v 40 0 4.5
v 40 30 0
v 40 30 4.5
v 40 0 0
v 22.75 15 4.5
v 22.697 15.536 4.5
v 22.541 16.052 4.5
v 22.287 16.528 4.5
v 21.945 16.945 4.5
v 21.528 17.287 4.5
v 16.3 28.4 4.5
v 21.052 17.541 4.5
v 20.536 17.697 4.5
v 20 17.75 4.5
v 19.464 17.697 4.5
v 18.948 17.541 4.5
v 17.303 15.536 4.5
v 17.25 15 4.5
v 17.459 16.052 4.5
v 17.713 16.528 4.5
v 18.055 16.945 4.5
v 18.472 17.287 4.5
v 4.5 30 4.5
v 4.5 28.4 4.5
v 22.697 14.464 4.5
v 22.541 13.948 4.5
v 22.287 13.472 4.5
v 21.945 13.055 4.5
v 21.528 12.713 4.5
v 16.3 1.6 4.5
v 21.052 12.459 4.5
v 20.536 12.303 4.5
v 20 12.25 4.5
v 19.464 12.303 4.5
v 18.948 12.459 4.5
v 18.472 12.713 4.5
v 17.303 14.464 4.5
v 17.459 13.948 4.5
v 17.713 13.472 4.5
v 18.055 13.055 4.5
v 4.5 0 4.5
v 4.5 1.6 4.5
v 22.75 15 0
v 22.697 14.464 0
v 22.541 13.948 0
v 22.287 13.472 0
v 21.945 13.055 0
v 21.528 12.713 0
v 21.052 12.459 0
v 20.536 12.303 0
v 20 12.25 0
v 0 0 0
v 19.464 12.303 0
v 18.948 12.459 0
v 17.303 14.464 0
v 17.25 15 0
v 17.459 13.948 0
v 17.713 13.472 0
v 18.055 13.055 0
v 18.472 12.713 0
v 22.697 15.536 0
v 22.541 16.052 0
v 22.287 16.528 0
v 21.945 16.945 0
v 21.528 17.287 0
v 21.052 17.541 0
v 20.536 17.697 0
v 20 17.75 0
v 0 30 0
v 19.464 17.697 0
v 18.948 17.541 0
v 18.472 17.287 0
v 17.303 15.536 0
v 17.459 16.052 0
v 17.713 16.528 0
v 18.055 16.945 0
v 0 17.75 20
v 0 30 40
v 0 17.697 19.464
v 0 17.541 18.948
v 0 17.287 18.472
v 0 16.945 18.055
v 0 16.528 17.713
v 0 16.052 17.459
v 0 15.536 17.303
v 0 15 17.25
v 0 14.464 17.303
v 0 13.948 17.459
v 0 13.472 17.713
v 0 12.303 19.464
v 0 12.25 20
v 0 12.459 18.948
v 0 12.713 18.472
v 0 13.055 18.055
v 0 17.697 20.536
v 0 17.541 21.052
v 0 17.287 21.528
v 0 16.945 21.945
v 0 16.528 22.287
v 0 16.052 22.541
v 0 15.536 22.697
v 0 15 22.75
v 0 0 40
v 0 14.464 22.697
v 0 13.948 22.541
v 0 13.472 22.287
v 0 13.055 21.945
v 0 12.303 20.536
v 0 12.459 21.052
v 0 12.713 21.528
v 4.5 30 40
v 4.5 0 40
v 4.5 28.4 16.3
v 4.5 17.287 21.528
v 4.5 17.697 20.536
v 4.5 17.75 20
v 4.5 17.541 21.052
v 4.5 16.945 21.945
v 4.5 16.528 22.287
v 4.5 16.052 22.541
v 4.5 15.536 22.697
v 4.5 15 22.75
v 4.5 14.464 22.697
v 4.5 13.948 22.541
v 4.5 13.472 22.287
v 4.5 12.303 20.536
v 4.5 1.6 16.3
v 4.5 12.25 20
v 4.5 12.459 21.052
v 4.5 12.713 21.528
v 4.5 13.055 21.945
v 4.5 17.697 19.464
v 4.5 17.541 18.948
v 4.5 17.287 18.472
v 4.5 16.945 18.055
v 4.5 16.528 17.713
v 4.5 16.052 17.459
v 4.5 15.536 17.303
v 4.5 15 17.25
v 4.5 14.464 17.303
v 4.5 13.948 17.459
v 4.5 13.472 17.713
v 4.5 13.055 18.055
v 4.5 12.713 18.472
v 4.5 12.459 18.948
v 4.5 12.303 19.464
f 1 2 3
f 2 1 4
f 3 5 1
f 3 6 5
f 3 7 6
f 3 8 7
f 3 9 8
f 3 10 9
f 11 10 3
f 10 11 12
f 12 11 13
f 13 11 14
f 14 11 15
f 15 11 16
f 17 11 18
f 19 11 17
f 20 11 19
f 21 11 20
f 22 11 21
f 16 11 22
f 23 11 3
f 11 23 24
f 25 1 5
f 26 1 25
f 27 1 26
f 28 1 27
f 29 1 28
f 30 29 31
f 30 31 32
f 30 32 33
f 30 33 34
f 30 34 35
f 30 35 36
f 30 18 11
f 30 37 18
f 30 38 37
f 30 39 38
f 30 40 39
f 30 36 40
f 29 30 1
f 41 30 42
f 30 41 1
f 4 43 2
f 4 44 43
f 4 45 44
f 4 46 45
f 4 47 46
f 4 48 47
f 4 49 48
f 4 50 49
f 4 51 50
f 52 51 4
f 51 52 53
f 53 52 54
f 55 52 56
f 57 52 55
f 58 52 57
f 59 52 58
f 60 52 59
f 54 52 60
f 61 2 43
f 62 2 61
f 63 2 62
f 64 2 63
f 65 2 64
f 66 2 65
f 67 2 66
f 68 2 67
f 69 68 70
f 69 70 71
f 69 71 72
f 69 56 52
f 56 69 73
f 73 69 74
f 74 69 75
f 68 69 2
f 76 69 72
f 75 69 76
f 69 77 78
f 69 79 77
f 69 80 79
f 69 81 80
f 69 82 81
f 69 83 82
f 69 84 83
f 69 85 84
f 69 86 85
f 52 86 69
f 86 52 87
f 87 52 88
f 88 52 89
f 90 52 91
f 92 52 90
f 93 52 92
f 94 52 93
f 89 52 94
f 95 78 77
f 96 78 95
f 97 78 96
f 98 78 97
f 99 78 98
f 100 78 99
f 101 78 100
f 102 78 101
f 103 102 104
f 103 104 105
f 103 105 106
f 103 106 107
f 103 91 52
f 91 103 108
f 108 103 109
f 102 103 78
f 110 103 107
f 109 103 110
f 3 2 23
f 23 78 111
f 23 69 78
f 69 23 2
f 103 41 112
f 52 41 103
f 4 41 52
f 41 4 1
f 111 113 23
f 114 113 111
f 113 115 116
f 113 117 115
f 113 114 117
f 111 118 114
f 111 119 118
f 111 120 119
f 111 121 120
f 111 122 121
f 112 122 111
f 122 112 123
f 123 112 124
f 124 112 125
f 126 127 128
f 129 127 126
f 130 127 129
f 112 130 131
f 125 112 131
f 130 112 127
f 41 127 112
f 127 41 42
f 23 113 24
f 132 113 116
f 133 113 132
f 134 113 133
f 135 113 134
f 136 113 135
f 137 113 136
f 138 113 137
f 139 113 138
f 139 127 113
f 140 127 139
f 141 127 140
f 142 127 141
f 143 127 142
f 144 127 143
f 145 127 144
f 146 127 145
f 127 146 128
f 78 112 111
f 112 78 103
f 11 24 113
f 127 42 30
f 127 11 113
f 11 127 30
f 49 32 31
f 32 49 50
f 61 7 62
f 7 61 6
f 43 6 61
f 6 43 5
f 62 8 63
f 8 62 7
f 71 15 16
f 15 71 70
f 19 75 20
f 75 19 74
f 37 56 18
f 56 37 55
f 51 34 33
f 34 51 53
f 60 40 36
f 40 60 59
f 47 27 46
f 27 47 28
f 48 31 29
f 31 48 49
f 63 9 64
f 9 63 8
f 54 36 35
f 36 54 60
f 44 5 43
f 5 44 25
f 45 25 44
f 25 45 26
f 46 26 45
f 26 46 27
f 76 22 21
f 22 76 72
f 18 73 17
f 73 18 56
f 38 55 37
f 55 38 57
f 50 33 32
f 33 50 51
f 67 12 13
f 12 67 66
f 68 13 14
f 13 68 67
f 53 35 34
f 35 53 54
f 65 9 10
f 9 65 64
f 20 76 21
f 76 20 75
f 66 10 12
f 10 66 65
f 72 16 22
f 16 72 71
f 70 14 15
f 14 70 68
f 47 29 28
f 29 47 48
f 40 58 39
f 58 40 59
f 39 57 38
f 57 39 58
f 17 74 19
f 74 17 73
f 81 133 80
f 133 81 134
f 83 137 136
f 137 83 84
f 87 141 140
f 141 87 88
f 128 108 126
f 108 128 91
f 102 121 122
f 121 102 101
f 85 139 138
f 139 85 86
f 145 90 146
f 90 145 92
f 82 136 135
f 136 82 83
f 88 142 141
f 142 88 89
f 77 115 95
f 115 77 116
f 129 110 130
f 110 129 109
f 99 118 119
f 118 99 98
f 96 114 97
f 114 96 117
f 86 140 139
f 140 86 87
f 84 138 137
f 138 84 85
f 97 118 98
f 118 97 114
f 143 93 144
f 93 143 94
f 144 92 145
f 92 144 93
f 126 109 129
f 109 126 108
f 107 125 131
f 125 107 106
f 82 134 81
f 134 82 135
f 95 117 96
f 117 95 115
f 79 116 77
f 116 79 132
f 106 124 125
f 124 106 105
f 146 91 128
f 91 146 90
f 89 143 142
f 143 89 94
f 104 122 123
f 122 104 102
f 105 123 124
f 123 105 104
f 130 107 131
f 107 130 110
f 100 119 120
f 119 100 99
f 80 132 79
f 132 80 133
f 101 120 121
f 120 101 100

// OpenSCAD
$fn = 32;

// ----------------------------------------------------------------------
// L-bracket: 40 x 30 x 40 mm
// ----------------------------------------------------------------------

// --- parameters (mm) ---
leg_a = 40;               // horizontal leg, X
leg_b = 40;               // vertical leg, Z
depth = 30;               // bracket depth, Y
thick = 4.5;              // plate thickness
hole_d = 5.5;             // clearance for M5
rib_leg = 19.2;           // gusset leg
rib_sink = 1.6;           // gusset overlap into the plates

module hole_z(px, py) {
  translate([px, py, -2.5]) cylinder(h = thick + 5, d = hole_d);
}
module hole_x(pz, py) {
  translate([-2.5, py, pz]) rotate([0, 90, 0]) cylinder(h = thick + 5, d = hole_d);
}
module gusset() {
  translate([0, depth - rib_sink, 0])
    rotate([90, 0, 0])
      linear_extrude(height = depth - 2 * rib_sink)
        polygon(points = [[rib_sink, rib_sink], [rib_leg, rib_sink], [rib_sink, rib_leg]]);
}

difference() {
  union() {
    /* horizontal leg */
    cube([leg_a, depth, thick]);
    /* vertical leg, overlapping the corner block */
    cube([thick, depth, leg_b]);
    gusset();
  }
  hole_z(20, 15);
  hole_x(20, 15);
}
